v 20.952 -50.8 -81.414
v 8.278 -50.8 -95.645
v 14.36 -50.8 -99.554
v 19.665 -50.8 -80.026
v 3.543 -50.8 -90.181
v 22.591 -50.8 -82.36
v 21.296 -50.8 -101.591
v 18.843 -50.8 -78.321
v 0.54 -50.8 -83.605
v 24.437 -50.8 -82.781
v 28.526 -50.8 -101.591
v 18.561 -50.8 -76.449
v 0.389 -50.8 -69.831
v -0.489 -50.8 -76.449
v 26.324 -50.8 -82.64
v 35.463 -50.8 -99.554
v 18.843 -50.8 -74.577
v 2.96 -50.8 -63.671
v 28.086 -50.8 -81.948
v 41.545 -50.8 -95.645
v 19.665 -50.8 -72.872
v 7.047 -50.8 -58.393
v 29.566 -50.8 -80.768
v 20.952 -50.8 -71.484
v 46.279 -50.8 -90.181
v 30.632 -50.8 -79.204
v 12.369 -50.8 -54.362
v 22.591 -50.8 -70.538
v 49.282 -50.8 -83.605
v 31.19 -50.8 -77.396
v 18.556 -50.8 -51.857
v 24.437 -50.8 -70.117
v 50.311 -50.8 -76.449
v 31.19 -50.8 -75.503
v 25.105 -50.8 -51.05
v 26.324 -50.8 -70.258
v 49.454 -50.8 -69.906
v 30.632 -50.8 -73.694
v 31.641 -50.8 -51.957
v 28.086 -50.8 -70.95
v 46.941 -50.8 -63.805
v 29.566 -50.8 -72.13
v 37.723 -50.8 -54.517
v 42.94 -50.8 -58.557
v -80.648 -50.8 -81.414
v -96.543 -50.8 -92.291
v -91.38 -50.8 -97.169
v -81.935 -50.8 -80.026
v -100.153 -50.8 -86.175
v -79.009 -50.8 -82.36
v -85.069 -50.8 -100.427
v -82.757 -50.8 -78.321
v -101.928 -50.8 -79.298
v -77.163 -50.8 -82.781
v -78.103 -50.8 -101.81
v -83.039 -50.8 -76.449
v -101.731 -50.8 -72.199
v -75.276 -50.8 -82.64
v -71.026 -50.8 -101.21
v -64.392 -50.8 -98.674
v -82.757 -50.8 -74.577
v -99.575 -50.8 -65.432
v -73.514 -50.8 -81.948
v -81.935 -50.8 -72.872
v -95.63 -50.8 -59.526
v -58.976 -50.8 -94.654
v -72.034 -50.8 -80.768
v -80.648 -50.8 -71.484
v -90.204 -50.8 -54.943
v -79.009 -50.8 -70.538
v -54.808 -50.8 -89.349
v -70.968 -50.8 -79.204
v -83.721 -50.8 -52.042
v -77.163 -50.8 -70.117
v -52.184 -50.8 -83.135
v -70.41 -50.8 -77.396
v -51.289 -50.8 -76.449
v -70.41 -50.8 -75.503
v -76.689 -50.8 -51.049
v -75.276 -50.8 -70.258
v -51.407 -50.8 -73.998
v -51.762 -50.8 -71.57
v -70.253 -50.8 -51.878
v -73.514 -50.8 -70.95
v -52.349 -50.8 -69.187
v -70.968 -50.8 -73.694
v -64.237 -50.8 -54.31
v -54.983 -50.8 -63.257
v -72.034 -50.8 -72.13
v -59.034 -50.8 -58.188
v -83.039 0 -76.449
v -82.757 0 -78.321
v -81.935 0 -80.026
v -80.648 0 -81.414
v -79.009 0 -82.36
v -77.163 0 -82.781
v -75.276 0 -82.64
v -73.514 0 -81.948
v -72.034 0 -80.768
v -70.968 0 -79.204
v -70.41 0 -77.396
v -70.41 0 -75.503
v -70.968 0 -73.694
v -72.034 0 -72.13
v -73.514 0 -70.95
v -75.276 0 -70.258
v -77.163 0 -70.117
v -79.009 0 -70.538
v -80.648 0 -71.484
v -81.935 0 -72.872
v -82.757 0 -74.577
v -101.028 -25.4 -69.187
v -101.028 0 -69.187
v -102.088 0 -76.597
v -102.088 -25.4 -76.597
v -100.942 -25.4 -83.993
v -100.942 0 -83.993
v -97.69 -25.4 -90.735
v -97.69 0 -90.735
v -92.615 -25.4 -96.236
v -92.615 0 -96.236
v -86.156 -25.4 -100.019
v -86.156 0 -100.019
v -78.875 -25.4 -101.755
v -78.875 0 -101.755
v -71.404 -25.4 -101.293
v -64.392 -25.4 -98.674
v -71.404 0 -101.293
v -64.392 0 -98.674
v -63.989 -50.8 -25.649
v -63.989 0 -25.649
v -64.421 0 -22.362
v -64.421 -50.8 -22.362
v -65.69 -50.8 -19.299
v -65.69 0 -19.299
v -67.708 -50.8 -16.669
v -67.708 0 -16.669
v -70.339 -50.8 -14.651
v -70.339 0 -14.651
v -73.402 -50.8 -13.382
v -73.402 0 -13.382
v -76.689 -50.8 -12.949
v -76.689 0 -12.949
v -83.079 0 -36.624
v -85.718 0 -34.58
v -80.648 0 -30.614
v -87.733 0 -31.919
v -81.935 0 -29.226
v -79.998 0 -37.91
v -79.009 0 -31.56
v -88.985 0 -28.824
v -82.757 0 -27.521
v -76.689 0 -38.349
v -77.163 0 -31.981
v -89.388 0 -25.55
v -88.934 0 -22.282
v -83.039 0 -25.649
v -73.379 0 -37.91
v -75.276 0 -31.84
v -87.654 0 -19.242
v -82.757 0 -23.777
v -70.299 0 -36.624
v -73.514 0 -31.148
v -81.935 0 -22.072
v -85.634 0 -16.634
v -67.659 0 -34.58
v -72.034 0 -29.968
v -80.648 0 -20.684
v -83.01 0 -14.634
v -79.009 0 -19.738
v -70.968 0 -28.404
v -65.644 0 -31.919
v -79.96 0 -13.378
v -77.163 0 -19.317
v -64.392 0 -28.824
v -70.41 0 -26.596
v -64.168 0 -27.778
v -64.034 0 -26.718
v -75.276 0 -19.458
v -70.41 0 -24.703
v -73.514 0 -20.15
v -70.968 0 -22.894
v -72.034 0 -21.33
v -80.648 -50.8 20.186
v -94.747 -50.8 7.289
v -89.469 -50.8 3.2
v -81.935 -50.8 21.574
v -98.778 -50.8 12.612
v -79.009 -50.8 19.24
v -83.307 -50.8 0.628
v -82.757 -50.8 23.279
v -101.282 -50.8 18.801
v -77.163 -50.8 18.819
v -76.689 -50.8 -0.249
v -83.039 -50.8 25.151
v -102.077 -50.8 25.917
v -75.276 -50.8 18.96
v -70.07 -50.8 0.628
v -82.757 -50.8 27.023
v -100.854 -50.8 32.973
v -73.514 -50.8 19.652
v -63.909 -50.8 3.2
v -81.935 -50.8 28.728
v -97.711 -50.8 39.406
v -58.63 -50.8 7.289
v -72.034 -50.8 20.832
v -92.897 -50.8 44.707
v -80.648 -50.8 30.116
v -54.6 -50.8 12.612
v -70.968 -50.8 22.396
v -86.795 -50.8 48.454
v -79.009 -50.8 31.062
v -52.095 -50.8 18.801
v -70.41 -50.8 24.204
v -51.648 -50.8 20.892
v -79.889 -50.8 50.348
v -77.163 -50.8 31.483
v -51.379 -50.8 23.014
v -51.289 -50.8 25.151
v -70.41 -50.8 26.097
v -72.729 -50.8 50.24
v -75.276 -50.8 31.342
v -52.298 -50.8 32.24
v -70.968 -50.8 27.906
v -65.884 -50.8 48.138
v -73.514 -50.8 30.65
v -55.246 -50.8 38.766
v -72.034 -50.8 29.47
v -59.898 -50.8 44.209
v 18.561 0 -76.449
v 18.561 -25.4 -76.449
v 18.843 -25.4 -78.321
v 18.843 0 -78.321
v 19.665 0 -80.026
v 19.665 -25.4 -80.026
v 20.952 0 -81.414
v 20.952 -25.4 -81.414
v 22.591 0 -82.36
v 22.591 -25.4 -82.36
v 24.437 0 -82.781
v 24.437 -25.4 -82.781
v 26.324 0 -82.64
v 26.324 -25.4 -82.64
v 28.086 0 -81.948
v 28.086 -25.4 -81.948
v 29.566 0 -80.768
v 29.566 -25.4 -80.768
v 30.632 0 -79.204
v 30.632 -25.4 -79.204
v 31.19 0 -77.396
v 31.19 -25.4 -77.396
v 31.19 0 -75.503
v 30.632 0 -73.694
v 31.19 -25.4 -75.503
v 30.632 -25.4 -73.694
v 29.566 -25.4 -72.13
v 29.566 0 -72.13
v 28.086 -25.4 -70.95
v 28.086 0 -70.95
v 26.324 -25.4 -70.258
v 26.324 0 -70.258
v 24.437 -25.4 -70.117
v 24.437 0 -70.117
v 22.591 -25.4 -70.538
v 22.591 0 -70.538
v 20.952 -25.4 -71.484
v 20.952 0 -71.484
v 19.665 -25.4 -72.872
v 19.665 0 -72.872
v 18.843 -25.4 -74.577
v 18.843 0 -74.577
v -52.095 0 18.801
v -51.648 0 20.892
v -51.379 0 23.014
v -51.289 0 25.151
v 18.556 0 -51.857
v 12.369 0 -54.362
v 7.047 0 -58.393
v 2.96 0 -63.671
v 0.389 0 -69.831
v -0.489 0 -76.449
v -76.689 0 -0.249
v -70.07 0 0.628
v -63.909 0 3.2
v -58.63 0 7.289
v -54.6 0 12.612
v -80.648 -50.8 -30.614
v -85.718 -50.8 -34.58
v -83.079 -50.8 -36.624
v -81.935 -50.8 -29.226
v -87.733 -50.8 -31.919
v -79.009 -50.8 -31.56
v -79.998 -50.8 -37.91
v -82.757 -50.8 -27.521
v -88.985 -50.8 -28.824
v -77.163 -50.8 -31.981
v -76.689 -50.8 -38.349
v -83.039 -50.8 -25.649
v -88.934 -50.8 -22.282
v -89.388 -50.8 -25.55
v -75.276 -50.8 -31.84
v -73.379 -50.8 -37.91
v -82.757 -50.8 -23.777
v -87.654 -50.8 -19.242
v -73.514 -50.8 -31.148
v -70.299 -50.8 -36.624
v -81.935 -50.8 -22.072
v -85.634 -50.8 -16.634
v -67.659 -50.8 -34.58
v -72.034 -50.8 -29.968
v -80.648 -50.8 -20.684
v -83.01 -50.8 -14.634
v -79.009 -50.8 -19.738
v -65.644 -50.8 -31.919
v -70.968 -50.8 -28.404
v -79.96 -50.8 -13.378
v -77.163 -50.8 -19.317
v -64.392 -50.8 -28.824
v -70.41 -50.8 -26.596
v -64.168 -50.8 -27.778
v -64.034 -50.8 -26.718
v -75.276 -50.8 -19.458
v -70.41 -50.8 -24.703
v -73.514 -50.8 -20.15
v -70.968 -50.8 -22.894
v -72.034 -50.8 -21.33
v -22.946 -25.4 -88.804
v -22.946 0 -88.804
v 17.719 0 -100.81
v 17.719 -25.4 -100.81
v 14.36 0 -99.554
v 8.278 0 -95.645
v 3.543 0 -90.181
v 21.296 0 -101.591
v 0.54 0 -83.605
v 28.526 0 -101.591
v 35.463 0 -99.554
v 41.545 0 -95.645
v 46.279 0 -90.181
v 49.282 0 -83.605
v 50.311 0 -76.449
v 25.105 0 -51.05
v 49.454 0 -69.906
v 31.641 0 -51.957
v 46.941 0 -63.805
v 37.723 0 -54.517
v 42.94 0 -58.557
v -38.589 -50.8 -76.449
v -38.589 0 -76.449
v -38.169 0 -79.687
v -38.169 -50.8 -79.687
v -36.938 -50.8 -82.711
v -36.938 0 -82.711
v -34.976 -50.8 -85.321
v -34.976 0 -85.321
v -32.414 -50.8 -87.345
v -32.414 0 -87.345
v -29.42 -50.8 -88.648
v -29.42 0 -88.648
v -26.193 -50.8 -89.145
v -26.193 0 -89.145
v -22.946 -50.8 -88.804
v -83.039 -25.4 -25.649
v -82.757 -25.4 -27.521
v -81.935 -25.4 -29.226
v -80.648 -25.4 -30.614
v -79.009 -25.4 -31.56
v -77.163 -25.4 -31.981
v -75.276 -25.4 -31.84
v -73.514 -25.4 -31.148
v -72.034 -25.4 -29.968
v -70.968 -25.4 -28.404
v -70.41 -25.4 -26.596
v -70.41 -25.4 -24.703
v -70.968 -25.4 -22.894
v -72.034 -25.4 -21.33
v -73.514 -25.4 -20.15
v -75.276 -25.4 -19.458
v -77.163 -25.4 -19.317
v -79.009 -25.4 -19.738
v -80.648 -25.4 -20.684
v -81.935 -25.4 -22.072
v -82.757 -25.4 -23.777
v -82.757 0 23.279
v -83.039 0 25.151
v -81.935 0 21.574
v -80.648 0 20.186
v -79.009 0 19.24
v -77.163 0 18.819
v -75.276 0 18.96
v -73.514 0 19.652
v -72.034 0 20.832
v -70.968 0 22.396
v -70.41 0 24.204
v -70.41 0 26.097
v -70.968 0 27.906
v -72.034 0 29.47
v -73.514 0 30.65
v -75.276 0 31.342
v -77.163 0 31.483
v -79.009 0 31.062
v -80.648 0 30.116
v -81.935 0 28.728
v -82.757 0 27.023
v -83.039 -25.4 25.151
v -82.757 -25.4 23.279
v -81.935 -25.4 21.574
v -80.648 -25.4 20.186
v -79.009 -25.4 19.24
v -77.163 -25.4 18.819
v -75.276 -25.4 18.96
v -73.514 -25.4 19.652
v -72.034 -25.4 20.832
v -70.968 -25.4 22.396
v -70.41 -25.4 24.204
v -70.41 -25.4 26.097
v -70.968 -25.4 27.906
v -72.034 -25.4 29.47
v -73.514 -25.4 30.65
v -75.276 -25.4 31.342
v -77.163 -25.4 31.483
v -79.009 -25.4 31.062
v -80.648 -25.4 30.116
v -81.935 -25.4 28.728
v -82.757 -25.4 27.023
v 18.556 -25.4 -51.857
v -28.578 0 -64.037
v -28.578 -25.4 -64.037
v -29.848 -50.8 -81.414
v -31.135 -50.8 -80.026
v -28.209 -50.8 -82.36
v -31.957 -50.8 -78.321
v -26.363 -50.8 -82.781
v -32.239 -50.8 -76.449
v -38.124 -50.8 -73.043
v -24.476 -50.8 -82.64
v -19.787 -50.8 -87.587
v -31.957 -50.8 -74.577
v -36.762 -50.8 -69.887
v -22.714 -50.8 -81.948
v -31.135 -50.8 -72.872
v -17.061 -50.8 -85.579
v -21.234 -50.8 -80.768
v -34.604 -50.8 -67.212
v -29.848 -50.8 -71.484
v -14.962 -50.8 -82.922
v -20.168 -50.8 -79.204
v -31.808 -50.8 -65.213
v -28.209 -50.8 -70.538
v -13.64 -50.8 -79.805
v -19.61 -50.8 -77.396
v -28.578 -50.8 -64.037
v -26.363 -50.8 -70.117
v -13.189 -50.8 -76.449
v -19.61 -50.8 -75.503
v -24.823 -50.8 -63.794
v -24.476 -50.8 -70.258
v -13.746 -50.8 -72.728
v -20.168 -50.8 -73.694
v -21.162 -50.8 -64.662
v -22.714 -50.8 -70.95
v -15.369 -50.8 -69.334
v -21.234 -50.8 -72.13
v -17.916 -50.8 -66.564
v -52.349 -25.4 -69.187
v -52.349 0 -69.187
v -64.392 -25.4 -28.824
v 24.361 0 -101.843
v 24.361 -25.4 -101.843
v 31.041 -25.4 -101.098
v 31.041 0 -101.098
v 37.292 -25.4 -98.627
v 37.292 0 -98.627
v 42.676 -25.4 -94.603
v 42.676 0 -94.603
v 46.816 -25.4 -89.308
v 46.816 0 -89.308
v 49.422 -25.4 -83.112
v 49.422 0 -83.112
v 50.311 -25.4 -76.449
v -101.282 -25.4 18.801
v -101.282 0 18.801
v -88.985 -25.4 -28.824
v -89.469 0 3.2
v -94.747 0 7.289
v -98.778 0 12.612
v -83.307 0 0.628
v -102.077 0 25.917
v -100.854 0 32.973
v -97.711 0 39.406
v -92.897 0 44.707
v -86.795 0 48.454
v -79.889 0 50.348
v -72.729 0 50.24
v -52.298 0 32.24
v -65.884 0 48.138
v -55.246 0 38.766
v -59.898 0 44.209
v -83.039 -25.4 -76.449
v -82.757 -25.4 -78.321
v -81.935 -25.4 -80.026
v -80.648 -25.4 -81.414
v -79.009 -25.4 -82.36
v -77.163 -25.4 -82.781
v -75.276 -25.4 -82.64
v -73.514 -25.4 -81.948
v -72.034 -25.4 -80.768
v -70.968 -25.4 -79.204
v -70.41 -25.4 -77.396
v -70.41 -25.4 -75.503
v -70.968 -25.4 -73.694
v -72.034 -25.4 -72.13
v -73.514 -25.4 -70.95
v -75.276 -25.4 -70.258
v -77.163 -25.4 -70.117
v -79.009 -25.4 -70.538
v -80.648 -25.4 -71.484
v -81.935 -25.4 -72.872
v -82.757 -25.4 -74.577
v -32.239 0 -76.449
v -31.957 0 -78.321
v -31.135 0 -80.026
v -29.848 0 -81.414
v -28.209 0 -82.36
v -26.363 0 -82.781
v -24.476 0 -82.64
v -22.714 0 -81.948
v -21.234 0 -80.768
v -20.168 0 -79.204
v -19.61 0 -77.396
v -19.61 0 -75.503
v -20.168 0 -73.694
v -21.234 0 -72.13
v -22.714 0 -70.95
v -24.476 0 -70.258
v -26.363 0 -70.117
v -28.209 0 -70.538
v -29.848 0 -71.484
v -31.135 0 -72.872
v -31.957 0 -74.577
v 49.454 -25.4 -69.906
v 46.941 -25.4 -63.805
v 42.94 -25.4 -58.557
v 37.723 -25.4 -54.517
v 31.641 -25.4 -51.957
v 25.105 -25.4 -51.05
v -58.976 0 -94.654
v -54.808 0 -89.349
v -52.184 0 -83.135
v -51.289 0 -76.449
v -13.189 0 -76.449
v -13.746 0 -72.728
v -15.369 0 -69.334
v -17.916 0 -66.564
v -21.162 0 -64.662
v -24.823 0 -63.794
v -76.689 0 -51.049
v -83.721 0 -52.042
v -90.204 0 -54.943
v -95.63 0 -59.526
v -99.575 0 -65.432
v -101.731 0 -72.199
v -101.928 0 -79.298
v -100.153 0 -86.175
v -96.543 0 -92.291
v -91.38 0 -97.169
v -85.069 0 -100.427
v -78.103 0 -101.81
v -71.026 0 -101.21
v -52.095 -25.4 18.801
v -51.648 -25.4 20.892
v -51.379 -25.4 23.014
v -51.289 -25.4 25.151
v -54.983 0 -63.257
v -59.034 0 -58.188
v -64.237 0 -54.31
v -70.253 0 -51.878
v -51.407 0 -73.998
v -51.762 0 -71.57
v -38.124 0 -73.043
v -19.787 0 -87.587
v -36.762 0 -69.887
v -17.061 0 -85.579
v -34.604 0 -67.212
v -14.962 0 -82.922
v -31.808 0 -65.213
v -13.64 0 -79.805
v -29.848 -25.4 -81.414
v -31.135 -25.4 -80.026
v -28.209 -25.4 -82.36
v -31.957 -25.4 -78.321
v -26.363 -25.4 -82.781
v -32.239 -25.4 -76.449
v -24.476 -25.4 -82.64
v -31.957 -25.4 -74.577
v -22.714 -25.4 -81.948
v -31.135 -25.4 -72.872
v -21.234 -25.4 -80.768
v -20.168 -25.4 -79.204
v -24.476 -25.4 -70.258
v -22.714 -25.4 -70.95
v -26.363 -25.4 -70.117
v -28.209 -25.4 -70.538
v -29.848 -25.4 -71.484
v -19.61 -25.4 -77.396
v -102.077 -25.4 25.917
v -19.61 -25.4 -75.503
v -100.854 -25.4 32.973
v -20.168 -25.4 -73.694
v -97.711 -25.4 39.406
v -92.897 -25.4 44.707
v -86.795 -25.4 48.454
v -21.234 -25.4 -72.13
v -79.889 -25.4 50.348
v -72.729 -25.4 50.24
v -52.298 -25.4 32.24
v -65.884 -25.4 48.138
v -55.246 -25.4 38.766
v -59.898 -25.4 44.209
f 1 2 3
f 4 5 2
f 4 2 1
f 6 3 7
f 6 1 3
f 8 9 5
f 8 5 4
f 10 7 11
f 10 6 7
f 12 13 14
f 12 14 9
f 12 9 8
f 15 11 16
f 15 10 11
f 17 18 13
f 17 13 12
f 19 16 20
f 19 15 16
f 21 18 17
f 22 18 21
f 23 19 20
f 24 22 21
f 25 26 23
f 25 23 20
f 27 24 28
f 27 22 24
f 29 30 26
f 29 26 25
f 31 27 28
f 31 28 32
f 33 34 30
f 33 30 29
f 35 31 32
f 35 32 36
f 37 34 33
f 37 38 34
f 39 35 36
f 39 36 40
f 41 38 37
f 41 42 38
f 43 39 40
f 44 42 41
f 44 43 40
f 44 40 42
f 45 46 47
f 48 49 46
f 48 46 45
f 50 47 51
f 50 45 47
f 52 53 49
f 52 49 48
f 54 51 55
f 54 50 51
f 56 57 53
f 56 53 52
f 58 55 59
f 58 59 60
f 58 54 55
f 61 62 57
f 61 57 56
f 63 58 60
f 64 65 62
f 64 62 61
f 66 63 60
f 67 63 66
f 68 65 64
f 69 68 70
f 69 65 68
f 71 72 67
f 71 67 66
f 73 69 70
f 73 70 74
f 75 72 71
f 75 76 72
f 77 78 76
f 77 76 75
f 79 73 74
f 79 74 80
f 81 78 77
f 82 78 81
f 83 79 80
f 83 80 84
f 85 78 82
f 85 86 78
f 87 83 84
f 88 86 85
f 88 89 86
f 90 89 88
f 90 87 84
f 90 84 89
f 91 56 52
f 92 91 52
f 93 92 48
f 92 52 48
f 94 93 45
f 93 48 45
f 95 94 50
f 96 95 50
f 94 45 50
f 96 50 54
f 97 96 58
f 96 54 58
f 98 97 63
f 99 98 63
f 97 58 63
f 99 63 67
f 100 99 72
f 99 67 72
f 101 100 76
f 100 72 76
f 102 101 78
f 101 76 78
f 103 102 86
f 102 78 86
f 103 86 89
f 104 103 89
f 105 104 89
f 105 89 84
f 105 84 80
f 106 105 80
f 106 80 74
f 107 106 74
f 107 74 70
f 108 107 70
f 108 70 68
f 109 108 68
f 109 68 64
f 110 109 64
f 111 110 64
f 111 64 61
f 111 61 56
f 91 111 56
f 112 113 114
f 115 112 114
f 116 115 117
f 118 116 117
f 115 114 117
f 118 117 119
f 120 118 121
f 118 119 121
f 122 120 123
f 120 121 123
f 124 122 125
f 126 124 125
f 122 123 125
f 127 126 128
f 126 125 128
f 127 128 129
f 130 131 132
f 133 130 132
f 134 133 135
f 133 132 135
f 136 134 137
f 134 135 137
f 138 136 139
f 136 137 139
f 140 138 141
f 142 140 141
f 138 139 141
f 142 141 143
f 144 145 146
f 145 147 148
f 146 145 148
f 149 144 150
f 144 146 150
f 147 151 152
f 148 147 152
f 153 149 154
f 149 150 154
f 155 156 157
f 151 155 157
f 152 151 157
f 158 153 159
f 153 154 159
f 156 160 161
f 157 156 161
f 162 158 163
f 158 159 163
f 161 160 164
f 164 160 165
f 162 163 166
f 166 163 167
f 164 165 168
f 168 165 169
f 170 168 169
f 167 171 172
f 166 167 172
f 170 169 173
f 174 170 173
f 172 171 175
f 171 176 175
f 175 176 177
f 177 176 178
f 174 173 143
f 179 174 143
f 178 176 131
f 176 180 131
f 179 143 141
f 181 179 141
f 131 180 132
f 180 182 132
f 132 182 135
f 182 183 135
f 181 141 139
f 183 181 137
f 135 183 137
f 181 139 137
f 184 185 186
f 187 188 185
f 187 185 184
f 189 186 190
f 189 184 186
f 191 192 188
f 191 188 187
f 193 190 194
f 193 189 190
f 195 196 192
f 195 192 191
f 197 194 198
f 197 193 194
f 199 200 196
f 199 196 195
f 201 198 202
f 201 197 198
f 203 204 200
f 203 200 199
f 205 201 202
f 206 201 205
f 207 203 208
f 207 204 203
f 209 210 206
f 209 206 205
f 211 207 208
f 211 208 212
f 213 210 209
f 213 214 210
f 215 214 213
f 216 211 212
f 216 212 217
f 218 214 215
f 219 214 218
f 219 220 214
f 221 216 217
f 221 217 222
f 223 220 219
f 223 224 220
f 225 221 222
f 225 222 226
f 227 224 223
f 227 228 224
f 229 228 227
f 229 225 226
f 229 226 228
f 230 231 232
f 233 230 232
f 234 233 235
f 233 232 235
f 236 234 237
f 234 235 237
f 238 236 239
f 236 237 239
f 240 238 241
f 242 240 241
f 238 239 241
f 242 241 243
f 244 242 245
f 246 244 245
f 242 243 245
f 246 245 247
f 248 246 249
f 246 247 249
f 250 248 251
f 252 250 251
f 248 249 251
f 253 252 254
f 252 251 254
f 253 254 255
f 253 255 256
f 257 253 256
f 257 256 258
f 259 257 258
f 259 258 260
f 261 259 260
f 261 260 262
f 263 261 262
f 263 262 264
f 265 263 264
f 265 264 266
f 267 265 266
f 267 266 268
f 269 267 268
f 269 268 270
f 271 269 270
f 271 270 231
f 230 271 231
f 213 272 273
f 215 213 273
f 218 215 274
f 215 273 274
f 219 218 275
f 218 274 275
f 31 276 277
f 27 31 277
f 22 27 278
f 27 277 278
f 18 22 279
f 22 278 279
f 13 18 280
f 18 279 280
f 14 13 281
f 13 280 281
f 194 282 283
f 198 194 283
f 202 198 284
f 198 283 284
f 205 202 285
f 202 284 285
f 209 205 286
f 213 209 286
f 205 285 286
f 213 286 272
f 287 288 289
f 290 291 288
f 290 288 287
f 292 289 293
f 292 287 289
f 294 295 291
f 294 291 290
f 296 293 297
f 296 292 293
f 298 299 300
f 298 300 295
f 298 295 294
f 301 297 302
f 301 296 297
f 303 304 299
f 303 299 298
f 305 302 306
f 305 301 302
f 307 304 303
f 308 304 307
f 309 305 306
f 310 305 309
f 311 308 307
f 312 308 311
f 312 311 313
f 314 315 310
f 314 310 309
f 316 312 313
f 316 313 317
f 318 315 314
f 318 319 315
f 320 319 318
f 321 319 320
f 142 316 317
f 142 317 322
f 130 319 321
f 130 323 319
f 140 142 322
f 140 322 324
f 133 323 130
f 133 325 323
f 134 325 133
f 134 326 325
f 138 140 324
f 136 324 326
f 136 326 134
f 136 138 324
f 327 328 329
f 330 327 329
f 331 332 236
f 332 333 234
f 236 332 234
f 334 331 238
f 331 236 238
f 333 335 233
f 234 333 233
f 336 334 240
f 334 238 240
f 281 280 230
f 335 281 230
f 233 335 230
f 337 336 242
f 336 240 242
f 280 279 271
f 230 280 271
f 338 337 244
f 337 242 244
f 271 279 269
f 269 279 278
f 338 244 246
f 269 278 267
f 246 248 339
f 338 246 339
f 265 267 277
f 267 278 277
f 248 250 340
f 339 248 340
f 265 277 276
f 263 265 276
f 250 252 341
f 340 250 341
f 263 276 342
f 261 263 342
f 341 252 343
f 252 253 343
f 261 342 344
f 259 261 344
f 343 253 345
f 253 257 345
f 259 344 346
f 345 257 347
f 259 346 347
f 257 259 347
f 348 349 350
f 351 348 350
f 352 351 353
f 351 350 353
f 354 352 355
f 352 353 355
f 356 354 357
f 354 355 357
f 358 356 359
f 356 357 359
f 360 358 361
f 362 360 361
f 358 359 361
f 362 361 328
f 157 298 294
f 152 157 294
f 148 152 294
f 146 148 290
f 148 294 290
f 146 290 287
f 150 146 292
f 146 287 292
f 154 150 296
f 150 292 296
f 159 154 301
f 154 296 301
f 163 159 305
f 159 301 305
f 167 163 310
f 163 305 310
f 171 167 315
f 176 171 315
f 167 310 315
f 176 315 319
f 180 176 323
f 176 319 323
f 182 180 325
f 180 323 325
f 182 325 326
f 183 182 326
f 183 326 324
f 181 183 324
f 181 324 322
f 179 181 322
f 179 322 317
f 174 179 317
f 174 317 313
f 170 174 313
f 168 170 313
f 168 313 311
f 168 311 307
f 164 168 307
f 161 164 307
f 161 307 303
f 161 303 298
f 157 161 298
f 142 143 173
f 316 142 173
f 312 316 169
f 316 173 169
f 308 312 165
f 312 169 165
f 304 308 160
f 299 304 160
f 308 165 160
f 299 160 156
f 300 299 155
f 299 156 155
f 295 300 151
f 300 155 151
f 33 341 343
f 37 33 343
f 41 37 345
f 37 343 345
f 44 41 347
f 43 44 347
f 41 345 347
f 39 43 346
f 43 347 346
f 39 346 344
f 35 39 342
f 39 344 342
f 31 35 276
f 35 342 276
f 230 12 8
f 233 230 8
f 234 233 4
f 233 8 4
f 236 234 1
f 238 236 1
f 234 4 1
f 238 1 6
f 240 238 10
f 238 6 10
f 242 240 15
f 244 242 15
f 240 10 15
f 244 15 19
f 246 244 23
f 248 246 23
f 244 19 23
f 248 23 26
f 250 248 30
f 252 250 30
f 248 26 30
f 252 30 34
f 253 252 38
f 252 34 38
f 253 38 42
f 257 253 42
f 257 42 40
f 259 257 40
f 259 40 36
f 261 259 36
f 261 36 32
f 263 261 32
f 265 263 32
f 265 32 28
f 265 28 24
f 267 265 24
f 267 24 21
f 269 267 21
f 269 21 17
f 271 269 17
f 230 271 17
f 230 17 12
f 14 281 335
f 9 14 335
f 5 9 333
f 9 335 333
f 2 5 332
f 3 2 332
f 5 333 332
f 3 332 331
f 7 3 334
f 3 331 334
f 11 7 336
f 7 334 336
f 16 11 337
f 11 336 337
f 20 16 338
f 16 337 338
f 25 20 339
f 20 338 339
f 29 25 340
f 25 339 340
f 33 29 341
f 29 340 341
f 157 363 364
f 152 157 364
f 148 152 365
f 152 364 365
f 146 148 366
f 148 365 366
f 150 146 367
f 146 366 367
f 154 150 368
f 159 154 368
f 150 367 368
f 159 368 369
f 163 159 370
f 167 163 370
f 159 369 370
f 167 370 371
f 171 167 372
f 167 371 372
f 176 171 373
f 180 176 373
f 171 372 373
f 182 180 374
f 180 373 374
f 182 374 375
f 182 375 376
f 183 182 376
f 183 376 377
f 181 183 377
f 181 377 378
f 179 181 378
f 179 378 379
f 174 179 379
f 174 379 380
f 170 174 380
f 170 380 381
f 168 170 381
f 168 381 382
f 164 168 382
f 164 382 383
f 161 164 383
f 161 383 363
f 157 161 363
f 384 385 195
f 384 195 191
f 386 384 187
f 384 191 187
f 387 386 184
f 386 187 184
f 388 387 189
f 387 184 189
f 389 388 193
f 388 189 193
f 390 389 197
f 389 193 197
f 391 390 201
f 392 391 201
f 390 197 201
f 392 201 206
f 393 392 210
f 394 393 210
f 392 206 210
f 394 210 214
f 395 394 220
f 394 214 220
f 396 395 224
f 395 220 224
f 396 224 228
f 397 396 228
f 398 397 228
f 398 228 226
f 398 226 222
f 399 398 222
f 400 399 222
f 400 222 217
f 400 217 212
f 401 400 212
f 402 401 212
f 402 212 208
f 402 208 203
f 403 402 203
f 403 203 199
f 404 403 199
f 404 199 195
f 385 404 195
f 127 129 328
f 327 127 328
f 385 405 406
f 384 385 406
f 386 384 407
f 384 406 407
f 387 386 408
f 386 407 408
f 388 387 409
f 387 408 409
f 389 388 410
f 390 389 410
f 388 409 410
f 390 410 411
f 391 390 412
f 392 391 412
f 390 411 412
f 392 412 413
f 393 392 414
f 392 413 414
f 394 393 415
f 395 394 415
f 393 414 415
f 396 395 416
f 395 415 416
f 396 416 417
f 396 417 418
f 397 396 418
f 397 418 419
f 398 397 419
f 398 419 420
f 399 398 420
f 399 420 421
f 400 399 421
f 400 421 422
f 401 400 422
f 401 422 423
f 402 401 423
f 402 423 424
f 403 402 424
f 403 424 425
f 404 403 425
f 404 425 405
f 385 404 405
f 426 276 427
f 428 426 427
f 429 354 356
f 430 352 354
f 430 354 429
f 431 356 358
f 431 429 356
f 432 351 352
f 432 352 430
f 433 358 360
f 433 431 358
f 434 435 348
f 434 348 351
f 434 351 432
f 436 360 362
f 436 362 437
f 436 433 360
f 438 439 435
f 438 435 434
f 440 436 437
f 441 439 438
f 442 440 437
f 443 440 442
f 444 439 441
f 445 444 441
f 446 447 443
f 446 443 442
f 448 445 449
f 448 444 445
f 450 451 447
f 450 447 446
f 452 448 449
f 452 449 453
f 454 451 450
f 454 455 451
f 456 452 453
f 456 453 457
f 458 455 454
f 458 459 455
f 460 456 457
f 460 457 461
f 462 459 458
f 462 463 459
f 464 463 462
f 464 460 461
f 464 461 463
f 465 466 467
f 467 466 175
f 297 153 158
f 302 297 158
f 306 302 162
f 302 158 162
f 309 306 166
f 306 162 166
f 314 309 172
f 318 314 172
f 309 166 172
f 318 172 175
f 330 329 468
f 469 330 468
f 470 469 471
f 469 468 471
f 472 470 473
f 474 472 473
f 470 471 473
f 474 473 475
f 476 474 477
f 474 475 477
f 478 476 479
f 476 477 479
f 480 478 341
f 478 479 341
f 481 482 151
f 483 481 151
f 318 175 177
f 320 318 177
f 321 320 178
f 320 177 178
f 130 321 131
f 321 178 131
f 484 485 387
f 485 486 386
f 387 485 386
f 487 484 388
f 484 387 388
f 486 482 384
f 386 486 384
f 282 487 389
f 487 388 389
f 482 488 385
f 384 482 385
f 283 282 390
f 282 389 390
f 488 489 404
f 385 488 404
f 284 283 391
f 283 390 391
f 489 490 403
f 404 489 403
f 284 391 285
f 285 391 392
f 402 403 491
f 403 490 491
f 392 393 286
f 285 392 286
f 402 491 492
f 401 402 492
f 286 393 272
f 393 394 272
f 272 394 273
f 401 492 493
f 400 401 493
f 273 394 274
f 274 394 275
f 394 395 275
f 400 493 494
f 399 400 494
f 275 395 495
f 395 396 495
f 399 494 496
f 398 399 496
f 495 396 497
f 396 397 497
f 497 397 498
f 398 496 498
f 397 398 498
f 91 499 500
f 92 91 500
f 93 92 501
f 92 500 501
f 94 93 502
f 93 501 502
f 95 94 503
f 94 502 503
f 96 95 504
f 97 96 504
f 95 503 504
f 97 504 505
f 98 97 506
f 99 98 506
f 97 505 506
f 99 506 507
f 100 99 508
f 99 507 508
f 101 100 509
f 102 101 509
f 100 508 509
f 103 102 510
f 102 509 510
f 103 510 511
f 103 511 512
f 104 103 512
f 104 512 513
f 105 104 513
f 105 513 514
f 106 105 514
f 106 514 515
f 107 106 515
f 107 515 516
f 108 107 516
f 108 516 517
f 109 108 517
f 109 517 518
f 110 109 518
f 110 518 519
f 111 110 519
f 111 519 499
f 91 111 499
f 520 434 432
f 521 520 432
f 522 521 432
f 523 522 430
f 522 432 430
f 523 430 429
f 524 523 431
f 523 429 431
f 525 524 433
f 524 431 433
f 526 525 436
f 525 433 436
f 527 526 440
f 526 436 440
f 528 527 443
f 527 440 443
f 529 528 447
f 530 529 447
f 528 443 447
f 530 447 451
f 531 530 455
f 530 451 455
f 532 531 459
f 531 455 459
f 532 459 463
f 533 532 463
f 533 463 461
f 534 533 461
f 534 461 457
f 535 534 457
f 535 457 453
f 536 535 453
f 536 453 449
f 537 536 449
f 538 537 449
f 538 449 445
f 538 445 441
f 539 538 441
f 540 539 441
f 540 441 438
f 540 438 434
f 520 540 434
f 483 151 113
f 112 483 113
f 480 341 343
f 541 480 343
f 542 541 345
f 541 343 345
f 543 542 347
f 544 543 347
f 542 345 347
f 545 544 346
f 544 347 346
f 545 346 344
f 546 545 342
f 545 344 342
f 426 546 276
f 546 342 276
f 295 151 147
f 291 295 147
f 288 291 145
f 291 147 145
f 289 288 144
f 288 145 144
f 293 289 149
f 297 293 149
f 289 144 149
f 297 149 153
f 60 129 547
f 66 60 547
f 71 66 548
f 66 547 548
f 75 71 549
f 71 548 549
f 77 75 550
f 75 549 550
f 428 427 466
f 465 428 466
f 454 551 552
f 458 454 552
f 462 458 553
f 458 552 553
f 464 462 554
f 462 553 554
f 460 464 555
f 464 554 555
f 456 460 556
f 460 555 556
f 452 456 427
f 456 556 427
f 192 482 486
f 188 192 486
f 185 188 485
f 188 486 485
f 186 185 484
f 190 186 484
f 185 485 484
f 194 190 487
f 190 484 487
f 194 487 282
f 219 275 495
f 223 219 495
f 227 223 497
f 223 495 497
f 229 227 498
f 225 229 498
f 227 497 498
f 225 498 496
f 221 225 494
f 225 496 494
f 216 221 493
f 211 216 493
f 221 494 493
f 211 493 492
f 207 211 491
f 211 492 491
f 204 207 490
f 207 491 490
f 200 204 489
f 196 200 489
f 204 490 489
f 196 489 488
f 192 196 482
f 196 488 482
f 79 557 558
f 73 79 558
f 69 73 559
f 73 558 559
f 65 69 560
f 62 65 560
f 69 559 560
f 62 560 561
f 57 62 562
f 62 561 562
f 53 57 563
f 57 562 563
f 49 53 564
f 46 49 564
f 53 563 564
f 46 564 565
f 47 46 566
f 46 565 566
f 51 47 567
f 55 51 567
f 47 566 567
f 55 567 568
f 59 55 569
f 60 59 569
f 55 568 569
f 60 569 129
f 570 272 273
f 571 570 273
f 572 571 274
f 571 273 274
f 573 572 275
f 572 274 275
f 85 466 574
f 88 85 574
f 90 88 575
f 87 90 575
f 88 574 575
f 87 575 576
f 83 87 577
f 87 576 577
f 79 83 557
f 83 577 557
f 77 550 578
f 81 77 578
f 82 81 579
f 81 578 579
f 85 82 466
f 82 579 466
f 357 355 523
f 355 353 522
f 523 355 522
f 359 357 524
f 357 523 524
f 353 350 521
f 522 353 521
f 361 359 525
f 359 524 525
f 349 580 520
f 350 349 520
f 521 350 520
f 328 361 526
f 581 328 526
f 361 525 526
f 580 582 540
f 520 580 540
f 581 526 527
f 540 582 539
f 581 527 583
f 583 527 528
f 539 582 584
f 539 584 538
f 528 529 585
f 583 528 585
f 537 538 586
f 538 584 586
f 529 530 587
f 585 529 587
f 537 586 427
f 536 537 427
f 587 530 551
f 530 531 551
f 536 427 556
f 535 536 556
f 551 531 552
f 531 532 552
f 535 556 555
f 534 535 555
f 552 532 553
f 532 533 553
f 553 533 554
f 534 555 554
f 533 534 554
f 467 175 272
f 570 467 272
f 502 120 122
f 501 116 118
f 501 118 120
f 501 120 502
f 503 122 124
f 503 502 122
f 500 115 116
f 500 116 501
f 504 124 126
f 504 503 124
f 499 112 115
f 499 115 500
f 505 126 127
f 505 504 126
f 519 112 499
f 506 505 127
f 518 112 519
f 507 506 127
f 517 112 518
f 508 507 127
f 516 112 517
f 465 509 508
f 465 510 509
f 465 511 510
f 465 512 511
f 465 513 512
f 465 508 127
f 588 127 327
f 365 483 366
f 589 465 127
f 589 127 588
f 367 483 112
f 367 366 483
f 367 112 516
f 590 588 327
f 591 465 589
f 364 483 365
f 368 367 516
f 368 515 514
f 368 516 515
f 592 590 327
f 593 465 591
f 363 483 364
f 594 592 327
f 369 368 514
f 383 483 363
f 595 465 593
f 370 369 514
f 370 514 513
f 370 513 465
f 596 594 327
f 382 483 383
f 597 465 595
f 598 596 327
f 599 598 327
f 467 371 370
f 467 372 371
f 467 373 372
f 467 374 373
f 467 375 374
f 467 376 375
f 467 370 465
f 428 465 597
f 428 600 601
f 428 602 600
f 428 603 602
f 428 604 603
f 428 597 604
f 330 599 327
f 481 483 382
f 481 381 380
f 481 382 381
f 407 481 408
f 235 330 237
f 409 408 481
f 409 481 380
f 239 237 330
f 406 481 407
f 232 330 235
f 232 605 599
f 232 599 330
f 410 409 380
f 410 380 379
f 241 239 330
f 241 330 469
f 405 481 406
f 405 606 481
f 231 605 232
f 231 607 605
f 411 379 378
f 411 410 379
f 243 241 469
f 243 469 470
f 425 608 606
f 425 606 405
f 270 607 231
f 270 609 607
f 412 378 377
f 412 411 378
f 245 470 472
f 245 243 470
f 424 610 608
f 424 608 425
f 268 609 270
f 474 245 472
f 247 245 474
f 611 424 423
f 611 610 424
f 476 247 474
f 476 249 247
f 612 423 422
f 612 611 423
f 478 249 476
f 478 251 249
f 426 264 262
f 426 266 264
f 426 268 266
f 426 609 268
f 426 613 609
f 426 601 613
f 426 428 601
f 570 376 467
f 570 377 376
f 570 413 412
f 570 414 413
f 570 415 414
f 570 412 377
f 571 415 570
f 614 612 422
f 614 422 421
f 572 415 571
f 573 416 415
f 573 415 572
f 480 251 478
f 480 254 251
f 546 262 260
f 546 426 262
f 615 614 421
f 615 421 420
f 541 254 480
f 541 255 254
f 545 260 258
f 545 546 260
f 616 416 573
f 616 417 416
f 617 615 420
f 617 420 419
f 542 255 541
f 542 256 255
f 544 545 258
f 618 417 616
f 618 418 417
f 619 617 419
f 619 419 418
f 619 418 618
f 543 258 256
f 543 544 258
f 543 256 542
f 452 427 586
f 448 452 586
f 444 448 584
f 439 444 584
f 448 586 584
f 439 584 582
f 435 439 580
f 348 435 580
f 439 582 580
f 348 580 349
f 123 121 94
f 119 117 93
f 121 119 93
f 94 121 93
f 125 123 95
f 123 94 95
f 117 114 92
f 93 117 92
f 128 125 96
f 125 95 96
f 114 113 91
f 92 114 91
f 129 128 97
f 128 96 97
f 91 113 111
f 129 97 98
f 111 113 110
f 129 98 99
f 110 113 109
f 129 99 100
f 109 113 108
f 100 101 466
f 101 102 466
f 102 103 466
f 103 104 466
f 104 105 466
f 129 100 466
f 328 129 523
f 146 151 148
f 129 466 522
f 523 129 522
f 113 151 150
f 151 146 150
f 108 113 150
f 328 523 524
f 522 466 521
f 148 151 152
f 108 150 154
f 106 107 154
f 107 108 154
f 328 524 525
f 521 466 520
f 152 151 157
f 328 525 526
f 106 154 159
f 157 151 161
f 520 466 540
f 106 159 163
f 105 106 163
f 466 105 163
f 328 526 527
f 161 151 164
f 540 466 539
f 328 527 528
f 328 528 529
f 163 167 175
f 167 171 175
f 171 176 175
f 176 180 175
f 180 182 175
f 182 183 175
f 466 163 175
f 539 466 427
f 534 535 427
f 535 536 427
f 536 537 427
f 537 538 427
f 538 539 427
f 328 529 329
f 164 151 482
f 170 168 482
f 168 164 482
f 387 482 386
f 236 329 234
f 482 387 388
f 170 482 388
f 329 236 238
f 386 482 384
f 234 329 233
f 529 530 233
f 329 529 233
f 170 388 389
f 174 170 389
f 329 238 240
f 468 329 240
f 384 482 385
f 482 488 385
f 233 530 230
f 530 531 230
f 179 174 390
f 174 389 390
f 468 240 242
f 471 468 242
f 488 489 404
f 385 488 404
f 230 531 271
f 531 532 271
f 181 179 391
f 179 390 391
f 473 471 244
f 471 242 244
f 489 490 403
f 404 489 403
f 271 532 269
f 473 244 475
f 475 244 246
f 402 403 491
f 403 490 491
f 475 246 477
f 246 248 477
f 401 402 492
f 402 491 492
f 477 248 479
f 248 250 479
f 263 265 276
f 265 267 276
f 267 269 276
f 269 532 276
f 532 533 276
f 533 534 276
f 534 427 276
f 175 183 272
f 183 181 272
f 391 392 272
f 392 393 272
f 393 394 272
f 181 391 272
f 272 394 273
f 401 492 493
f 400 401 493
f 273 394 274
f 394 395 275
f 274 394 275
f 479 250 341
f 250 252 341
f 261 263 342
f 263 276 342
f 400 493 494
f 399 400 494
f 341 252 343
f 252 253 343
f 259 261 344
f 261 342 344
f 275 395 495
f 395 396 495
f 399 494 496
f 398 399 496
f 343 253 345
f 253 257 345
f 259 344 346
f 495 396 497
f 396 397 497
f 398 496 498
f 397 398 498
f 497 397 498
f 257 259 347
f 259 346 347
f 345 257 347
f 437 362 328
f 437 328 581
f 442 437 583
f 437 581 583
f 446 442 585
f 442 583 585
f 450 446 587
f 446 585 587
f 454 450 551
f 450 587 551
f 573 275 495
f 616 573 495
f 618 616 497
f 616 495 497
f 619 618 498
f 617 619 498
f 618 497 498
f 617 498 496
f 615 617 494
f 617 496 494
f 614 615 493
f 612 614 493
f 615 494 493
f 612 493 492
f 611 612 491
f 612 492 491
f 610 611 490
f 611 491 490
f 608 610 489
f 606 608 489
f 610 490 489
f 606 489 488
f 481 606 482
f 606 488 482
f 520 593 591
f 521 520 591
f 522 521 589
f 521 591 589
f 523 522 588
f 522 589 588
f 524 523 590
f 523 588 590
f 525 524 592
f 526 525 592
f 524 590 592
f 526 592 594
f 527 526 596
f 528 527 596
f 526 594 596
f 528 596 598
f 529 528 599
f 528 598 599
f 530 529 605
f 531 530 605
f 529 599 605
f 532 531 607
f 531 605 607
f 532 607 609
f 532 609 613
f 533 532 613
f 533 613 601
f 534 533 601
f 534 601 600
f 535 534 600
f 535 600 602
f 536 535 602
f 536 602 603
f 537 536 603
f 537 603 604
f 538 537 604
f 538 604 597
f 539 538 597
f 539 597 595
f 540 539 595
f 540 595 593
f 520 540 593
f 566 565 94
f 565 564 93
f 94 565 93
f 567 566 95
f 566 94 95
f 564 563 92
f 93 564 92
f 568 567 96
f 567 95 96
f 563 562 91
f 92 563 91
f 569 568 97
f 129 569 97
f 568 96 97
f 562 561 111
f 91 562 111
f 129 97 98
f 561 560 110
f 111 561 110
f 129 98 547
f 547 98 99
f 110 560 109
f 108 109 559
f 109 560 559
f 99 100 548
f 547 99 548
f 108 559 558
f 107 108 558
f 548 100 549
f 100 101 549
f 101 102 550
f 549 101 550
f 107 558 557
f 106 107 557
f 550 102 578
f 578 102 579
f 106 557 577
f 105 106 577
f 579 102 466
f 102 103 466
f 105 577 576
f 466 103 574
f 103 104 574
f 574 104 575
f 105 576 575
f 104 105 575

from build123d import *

# Parameters (mm, degrees)
F1_DEPTH = 50.8
F2_DEPTH = 25.4
F3_D     = 12.7
F3_2_D   = 12.7
F3_3_D   = 12.7
F3_4_D   = 12.7
F3_5_D   = 12.7
F3_6_D   = 12.7


with BuildPart() as f1:
    # F0 (on Front) → F1 (new body)
    with BuildSketch(Plane.XZ):
        with BuildLine():
            ThreePointArc((-76.688706116, -0.2491279063), (-61.1344462494, 5.0704089517), (-52.0952618676, 18.8008720937))
            ThreePointArc((-52.0952618676, 18.8008720937), (-51.4911518308, 21.9503630647), (-51.288706116, 25.1508720937))
            ThreePointArc((-51.288706116, 25.1508720937), (-79.8892151451, 50.3484263789), (-101.2821503645, 18.8008720937))
            ThreePointArc((-101.2821503645, 18.8008720937), (-92.2429659827, 5.0704089517), (-76.688706116, -0.2491279063))
        make_face()
    extrude(amount=F1_DEPTH)

    # F3 (through all)
    with Locations(Plane(origin=(0, 0, 0), x_dir=(1, 0, 0), z_dir=(0, 1, 0))):
        with Locations((-76.688706116, -25.1508720937), (-76.688706116, 25.6491279063), (-76.688706116, 76.4491279063), (-25.888706116, 76.4491279063), (24.911293884, 76.4491279063)):
            Hole(F3_D / 2)


with BuildPart() as f1b:
    # F0 (on Front) → F1, piece 2 (new body)
    with BuildSketch(Plane.XZ):
        with BuildLine():
            ThreePointArc((50.311293884, -76.4491279063), (40.463527775, -56.3670956137), (18.5563316005, -51.856965448))
            ThreePointArc((18.5563316005, -51.856965448), (4.8292615914, -60.8968940153), (-0.488706116, -76.4491279063))
            ThreePointArc((-0.488706116, -76.4491279063), (4.5662661321, -91.6557003595), (17.719155756, -100.8096112584))
            ThreePointArc((17.719155756, -100.8096112584), (40.1178663372, -96.7941556582), (50.311293884, -76.4491279063))
        make_face()
    extrude(amount=F1_DEPTH)

    # F3#2 (through all)
    with Locations(Plane(origin=(0, 0, 0), x_dir=(1, 0, 0), z_dir=(0, 1, 0))):
        with Locations((-76.688706116, -25.1508720937), (-76.688706116, 25.6491279063), (-76.688706116, 76.4491279063), (-25.888706116, 76.4491279063), (24.911293884, 76.4491279063)):
            Hole(F3_2_D / 2)


with BuildPart() as f1c:
    # F0 (on Front) → F1, piece 3 (new body)
    with BuildSketch(Plane.XZ):
        with BuildLine():
            ThreePointArc((-88.9854282402, -28.8241279063), (-84.4658360494, -35.6893594773), (-76.688706116, -38.3491279063))
            Line((-76.688706116, -38.3491279063), (-76.688706116, -25.6491279063))
            Line((-76.688706116, -25.6491279063), (-76.688706116, -12.9491279063))
            ThreePointArc((-76.688706116, -12.9491279063), (-86.7289376871, -17.8719979729), (-88.9854282402, -28.8241279063))
        make_face()
        with BuildLine():
            Line((-76.688706116, -25.6491279063), (-76.688706116, -38.3491279063))
            ThreePointArc((-76.688706116, -38.3491279063), (-68.9115761827, -35.6893594773), (-64.3919839918, -28.8241279063))
            ThreePointArc((-64.3919839918, -28.8241279063), (-64.0899289734, -27.2493824208), (-63.988706116, -25.6491279063))
            ThreePointArc((-63.988706116, -25.6491279063), (-67.708449995, -16.6688717852), (-76.688706116, -12.9491279063))
            Line((-76.688706116, -12.9491279063), (-76.688706116, -25.6491279063))
        make_face()
    extrude(amount=F1_DEPTH)

    # F3#3 (through all)
    with Locations(Plane(origin=(0, 0, 0), x_dir=(1, 0, 0), z_dir=(0, 1, 0))):
        with Locations((-76.688706116, -25.1508720937), (-76.688706116, 25.6491279063), (-76.688706116, 76.4491279063), (-25.888706116, 76.4491279063), (24.911293884, 76.4491279063)):
            Hole(F3_3_D / 2)


with BuildPart() as f1d:
    # F0 (on Front) → F1, piece 4 (new body)
    with BuildSketch(Plane.XZ):
        with BuildLine():
            Line((-51.288706116, -76.4491279063), (-76.688706116, -76.4491279063))
            Line((-76.688706116, -76.4491279063), (-76.688706116, -51.0491279063))
            ThreePointArc((-76.688706116, -51.0491279063), (-91.8660000806, -56.0822492079), (-101.0283994346, -69.1869430312))
            ThreePointArc((-101.0283994346, -69.1869430312), (-92.6145281281, -96.2361992722), (-64.3919839918, -98.6741279063))
            ThreePointArc((-64.3919839918, -98.6741279063), (-54.8083868547, -89.3491910465), (-51.288706116, -76.4491279063))
        make_face()
        with BuildLine():
            Line((-76.688706116, -51.0491279063), (-76.688706116, -76.4491279063))
            Line((-76.688706116, -76.4491279063), (-51.288706116, -76.4491279063))
            ThreePointArc((-51.288706116, -76.4491279063), (-51.5551805944, -72.7795373495), (-52.3490127975, -69.1869430312))
            ThreePointArc((-52.3490127975, -69.1869430312), (-61.5114121515, -56.0822492079), (-76.688706116, -51.0491279063))
        make_face()
    extrude(amount=F1_DEPTH)

    # F3#4 (through all)
    with Locations(Plane(origin=(0, 0, 0), x_dir=(1, 0, 0), z_dir=(0, 1, 0))):
        with Locations((-76.688706116, -25.1508720937), (-76.688706116, 25.6491279063), (-76.688706116, 76.4491279063), (-25.888706116, 76.4491279063), (24.911293884, 76.4491279063)):
            Hole(F3_4_D / 2)


with BuildPart() as f1e:
    # F0 (on Front) → F1, piece 5 (new body)
    with BuildSketch(Plane.XZ):
        with BuildLine():
            ThreePointArc((-28.5776879381, -64.037062133), (-35.7740505496, -68.4760503681), (-38.588706116, -76.4491279063))
            Line((-38.588706116, -76.4491279063), (-25.888706116, -76.4491279063))
            Line((-25.888706116, -76.4491279063), (-13.188706116, -76.4491279063))
            ThreePointArc((-13.188706116, -76.4491279063), (-17.9156285779, -66.5637834727), (-28.5776879381, -64.037062133))
        make_face()
        with BuildLine():
            Line((-25.888706116, -76.4491279063), (-38.588706116, -76.4491279063))
            ThreePointArc((-38.588706116, -76.4491279063), (-33.7602635805, -86.4155005204), (-22.9464095674, -88.8035963699))
            ThreePointArc((-22.9464095674, -88.8035963699), (-15.9223335019, -84.3206853707), (-13.188706116, -76.4491279063))
            Line((-13.188706116, -76.4491279063), (-25.888706116, -76.4491279063))
        make_face()
    extrude(amount=F1_DEPTH)

    # F3#5 (through all)
    with Locations(Plane(origin=(0, 0, 0), x_dir=(1, 0, 0), z_dir=(0, 1, 0))):
        with Locations((-76.688706116, -25.1508720937), (-76.688706116, 25.6491279063), (-76.688706116, 76.4491279063), (-25.888706116, 76.4491279063), (24.911293884, 76.4491279063)):
            Hole(F3_5_D / 2)


with BuildPart() as f2:
    # F0 (on Front) → F2 (new body)
    with BuildSketch(Plane.XZ):
        with BuildLine():
            Line((-76.688706116, -51.0491279063), (-76.688706116, -76.4491279063))
            Line((-76.688706116, -76.4491279063), (-51.288706116, -76.4491279063))
            ThreePointArc((-51.288706116, -76.4491279063), (-51.5551805944, -72.7795373495), (-52.3490127975, -69.1869430312))
            ThreePointArc((-52.3490127975, -69.1869430312), (-61.5114121515, -56.0822492079), (-76.688706116, -51.0491279063))
        make_face()
        with BuildLine():
            Line((-51.288706116, -76.4491279063), (-76.688706116, -76.4491279063))
            Line((-76.688706116, -76.4491279063), (-76.688706116, -51.0491279063))
            ThreePointArc((-76.688706116, -51.0491279063), (-91.8660000806, -56.0822492079), (-101.0283994346, -69.1869430312))
            ThreePointArc((-101.0283994346, -69.1869430312), (-92.6145281281, -96.2361992722), (-64.3919839918, -98.6741279063))
            ThreePointArc((-64.3919839918, -98.6741279063), (-54.8083868547, -89.3491910465), (-51.288706116, -76.4491279063))
        make_face()
        with BuildLine():
            ThreePointArc((-52.3490127975, -69.1869430312), (-51.5551805944, -72.7795373495), (-51.288706116, -76.4491279063))
            Line((-51.288706116, -76.4491279063), (-38.588706116, -76.4491279063))
            ThreePointArc((-38.588706116, -76.4491279063), (-35.7740505496, -68.4760503681), (-28.5776879381, -64.037062133))
            Line((-28.5776879381, -64.037062133), (-52.3490127975, -69.1869430312))
        make_face()
        with BuildLine():
            Line((-38.588706116, -76.4491279063), (-51.288706116, -76.4491279063))
            ThreePointArc((-51.288706116, -76.4491279063), (-54.8083868547, -89.3491910465), (-64.3919839918, -98.6741279063))
            Line((-64.3919839918, -98.6741279063), (-22.9464095674, -88.8035963699))
            ThreePointArc((-22.9464095674, -88.8035963699), (-33.7602635805, -86.4155005204), (-38.588706116, -76.4491279063))
        make_face()
        with BuildLine():
            ThreePointArc((-101.0283994346, -69.1869430312), (-91.8660000806, -56.0822492079), (-76.688706116, -51.0491279063))
            Line((-76.688706116, -51.0491279063), (-76.688706116, -38.3491279063))
            ThreePointArc((-76.688706116, -38.3491279063), (-84.4658360494, -35.6893594773), (-88.9854282402, -28.8241279063))
            Line((-88.9854282402, -28.8241279063), (-101.0283994346, -69.1869430312))
        make_face()
        with BuildLine():
            Line((-76.688706116, -38.3491279063), (-76.688706116, -51.0491279063))
            ThreePointArc((-76.688706116, -51.0491279063), (-61.5114121515, -56.0822492079), (-52.3490127975, -69.1869430312))
            Line((-52.3490127975, -69.1869430312), (-64.3919839918, -28.8241279063))
            ThreePointArc((-64.3919839918, -28.8241279063), (-68.9115761827, -35.6893594773), (-76.688706116, -38.3491279063))
        make_face()
        with BuildLine():
            ThreePointArc((-28.5776879381, -64.037062133), (-35.7740505496, -68.4760503681), (-38.588706116, -76.4491279063))
            Line((-38.588706116, -76.4491279063), (-25.888706116, -76.4491279063))
            Line((-25.888706116, -76.4491279063), (-13.188706116, -76.4491279063))
            ThreePointArc((-13.188706116, -76.4491279063), (-17.9156285779, -66.5637834727), (-28.5776879381, -64.037062133))
        make_face()
        with BuildLine():
            Line((-25.888706116, -76.4491279063), (-38.588706116, -76.4491279063))
            ThreePointArc((-38.588706116, -76.4491279063), (-33.7602635805, -86.4155005204), (-22.9464095674, -88.8035963699))
            ThreePointArc((-22.9464095674, -88.8035963699), (-15.9223335019, -84.3206853707), (-13.188706116, -76.4491279063))
            Line((-13.188706116, -76.4491279063), (-25.888706116, -76.4491279063))
        make_face()
        with BuildLine():
            ThreePointArc((-88.9854282402, -28.8241279063), (-84.4658360494, -35.6893594773), (-76.688706116, -38.3491279063))
            Line((-76.688706116, -38.3491279063), (-76.688706116, -25.6491279063))
            Line((-76.688706116, -25.6491279063), (-76.688706116, -12.9491279063))
            ThreePointArc((-76.688706116, -12.9491279063), (-86.7289376871, -17.8719979729), (-88.9854282402, -28.8241279063))
        make_face()
        with BuildLine():
            Line((-76.688706116, -25.6491279063), (-76.688706116, -38.3491279063))
            ThreePointArc((-76.688706116, -38.3491279063), (-68.9115761827, -35.6893594773), (-64.3919839918, -28.8241279063))
            ThreePointArc((-64.3919839918, -28.8241279063), (-64.0899289734, -27.2493824208), (-63.988706116, -25.6491279063))
            ThreePointArc((-63.988706116, -25.6491279063), (-67.708449995, -16.6688717852), (-76.688706116, -12.9491279063))
            Line((-76.688706116, -12.9491279063), (-76.688706116, -25.6491279063))
        make_face()
        with BuildLine():
            Line((18.5563316005, -51.856965448), (-28.5776879381, -64.037062133))
            ThreePointArc((-28.5776879381, -64.037062133), (-17.9156285779, -66.5637834727), (-13.188706116, -76.4491279063))
            Line((-13.188706116, -76.4491279063), (-0.488706116, -76.4491279063))
            ThreePointArc((-0.488706116, -76.4491279063), (4.8292615914, -60.8968940153), (18.5563316005, -51.856965448))
        make_face()
        with BuildLine():
            ThreePointArc((-13.188706116, -76.4491279063), (-15.9223335019, -84.3206853707), (-22.9464095674, -88.8035963699))
            Line((-22.9464095674, -88.8035963699), (17.719155756, -100.8096112584))
            ThreePointArc((17.719155756, -100.8096112584), (4.5662661321, -91.6557003595), (-0.488706116, -76.4491279063))
            Line((-0.488706116, -76.4491279063), (-13.188706116, -76.4491279063))
        make_face()
        with BuildLine():
            ThreePointArc((-63.988706116, -25.6491279063), (-64.0899289734, -27.2493824208), (-64.3919839918, -28.8241279063))
            Line((-64.3919839918, -28.8241279063), (-52.0952618676, 18.8008720937))
            ThreePointArc((-52.0952618676, 18.8008720937), (-61.1344462494, 5.0704089517), (-76.688706116, -0.2491279063))
            Line((-76.688706116, -0.2491279063), (-76.688706116, -12.9491279063))
            ThreePointArc((-76.688706116, -12.9491279063), (-67.708449995, -16.6688717852), (-63.988706116, -25.6491279063))
        make_face()
        with BuildLine():
            Line((-101.2821503645, 18.8008720937), (-88.9854282402, -28.8241279063))
            ThreePointArc((-88.9854282402, -28.8241279063), (-86.7289376871, -17.8719979729), (-76.688706116, -12.9491279063))
            Line((-76.688706116, -12.9491279063), (-76.688706116, -0.2491279063))
            ThreePointArc((-76.688706116, -0.2491279063), (-92.2429659827, 5.0704089517), (-101.2821503645, 18.8008720937))
        make_face()
        with BuildLine():
            ThreePointArc((50.311293884, -76.4491279063), (40.463527775, -56.3670956137), (18.5563316005, -51.856965448))
            ThreePointArc((18.5563316005, -51.856965448), (4.8292615914, -60.8968940153), (-0.488706116, -76.4491279063))
            ThreePointArc((-0.488706116, -76.4491279063), (4.5662661321, -91.6557003595), (17.719155756, -100.8096112584))
            ThreePointArc((17.719155756, -100.8096112584), (40.1178663372, -96.7941556582), (50.311293884, -76.4491279063))
        make_face()
        with BuildLine():
            ThreePointArc((-76.688706116, -0.2491279063), (-61.1344462494, 5.0704089517), (-52.0952618676, 18.8008720937))
            ThreePointArc((-52.0952618676, 18.8008720937), (-51.4911518308, 21.9503630647), (-51.288706116, 25.1508720937))
            ThreePointArc((-51.288706116, 25.1508720937), (-79.8892151451, 50.3484263789), (-101.2821503645, 18.8008720937))
            ThreePointArc((-101.2821503645, 18.8008720937), (-92.2429659827, 5.0704089517), (-76.688706116, -0.2491279063))
        make_face()
    extrude(amount=F2_DEPTH)

    # F3#6 (through all)
    with Locations(Plane(origin=(0, 0, 0), x_dir=(1, 0, 0), z_dir=(0, 1, 0))):
        with Locations((-76.688706116, -25.1508720937), (-76.688706116, 25.6491279063), (-76.688706116, 76.4491279063), (-25.888706116, 76.4491279063), (24.911293884, 76.4491279063)):
            Hole(F3_6_D / 2)


solid = Compound([f1.part, f1b.part, f1c.part, f1d.part, f1e.part, f2.part])
